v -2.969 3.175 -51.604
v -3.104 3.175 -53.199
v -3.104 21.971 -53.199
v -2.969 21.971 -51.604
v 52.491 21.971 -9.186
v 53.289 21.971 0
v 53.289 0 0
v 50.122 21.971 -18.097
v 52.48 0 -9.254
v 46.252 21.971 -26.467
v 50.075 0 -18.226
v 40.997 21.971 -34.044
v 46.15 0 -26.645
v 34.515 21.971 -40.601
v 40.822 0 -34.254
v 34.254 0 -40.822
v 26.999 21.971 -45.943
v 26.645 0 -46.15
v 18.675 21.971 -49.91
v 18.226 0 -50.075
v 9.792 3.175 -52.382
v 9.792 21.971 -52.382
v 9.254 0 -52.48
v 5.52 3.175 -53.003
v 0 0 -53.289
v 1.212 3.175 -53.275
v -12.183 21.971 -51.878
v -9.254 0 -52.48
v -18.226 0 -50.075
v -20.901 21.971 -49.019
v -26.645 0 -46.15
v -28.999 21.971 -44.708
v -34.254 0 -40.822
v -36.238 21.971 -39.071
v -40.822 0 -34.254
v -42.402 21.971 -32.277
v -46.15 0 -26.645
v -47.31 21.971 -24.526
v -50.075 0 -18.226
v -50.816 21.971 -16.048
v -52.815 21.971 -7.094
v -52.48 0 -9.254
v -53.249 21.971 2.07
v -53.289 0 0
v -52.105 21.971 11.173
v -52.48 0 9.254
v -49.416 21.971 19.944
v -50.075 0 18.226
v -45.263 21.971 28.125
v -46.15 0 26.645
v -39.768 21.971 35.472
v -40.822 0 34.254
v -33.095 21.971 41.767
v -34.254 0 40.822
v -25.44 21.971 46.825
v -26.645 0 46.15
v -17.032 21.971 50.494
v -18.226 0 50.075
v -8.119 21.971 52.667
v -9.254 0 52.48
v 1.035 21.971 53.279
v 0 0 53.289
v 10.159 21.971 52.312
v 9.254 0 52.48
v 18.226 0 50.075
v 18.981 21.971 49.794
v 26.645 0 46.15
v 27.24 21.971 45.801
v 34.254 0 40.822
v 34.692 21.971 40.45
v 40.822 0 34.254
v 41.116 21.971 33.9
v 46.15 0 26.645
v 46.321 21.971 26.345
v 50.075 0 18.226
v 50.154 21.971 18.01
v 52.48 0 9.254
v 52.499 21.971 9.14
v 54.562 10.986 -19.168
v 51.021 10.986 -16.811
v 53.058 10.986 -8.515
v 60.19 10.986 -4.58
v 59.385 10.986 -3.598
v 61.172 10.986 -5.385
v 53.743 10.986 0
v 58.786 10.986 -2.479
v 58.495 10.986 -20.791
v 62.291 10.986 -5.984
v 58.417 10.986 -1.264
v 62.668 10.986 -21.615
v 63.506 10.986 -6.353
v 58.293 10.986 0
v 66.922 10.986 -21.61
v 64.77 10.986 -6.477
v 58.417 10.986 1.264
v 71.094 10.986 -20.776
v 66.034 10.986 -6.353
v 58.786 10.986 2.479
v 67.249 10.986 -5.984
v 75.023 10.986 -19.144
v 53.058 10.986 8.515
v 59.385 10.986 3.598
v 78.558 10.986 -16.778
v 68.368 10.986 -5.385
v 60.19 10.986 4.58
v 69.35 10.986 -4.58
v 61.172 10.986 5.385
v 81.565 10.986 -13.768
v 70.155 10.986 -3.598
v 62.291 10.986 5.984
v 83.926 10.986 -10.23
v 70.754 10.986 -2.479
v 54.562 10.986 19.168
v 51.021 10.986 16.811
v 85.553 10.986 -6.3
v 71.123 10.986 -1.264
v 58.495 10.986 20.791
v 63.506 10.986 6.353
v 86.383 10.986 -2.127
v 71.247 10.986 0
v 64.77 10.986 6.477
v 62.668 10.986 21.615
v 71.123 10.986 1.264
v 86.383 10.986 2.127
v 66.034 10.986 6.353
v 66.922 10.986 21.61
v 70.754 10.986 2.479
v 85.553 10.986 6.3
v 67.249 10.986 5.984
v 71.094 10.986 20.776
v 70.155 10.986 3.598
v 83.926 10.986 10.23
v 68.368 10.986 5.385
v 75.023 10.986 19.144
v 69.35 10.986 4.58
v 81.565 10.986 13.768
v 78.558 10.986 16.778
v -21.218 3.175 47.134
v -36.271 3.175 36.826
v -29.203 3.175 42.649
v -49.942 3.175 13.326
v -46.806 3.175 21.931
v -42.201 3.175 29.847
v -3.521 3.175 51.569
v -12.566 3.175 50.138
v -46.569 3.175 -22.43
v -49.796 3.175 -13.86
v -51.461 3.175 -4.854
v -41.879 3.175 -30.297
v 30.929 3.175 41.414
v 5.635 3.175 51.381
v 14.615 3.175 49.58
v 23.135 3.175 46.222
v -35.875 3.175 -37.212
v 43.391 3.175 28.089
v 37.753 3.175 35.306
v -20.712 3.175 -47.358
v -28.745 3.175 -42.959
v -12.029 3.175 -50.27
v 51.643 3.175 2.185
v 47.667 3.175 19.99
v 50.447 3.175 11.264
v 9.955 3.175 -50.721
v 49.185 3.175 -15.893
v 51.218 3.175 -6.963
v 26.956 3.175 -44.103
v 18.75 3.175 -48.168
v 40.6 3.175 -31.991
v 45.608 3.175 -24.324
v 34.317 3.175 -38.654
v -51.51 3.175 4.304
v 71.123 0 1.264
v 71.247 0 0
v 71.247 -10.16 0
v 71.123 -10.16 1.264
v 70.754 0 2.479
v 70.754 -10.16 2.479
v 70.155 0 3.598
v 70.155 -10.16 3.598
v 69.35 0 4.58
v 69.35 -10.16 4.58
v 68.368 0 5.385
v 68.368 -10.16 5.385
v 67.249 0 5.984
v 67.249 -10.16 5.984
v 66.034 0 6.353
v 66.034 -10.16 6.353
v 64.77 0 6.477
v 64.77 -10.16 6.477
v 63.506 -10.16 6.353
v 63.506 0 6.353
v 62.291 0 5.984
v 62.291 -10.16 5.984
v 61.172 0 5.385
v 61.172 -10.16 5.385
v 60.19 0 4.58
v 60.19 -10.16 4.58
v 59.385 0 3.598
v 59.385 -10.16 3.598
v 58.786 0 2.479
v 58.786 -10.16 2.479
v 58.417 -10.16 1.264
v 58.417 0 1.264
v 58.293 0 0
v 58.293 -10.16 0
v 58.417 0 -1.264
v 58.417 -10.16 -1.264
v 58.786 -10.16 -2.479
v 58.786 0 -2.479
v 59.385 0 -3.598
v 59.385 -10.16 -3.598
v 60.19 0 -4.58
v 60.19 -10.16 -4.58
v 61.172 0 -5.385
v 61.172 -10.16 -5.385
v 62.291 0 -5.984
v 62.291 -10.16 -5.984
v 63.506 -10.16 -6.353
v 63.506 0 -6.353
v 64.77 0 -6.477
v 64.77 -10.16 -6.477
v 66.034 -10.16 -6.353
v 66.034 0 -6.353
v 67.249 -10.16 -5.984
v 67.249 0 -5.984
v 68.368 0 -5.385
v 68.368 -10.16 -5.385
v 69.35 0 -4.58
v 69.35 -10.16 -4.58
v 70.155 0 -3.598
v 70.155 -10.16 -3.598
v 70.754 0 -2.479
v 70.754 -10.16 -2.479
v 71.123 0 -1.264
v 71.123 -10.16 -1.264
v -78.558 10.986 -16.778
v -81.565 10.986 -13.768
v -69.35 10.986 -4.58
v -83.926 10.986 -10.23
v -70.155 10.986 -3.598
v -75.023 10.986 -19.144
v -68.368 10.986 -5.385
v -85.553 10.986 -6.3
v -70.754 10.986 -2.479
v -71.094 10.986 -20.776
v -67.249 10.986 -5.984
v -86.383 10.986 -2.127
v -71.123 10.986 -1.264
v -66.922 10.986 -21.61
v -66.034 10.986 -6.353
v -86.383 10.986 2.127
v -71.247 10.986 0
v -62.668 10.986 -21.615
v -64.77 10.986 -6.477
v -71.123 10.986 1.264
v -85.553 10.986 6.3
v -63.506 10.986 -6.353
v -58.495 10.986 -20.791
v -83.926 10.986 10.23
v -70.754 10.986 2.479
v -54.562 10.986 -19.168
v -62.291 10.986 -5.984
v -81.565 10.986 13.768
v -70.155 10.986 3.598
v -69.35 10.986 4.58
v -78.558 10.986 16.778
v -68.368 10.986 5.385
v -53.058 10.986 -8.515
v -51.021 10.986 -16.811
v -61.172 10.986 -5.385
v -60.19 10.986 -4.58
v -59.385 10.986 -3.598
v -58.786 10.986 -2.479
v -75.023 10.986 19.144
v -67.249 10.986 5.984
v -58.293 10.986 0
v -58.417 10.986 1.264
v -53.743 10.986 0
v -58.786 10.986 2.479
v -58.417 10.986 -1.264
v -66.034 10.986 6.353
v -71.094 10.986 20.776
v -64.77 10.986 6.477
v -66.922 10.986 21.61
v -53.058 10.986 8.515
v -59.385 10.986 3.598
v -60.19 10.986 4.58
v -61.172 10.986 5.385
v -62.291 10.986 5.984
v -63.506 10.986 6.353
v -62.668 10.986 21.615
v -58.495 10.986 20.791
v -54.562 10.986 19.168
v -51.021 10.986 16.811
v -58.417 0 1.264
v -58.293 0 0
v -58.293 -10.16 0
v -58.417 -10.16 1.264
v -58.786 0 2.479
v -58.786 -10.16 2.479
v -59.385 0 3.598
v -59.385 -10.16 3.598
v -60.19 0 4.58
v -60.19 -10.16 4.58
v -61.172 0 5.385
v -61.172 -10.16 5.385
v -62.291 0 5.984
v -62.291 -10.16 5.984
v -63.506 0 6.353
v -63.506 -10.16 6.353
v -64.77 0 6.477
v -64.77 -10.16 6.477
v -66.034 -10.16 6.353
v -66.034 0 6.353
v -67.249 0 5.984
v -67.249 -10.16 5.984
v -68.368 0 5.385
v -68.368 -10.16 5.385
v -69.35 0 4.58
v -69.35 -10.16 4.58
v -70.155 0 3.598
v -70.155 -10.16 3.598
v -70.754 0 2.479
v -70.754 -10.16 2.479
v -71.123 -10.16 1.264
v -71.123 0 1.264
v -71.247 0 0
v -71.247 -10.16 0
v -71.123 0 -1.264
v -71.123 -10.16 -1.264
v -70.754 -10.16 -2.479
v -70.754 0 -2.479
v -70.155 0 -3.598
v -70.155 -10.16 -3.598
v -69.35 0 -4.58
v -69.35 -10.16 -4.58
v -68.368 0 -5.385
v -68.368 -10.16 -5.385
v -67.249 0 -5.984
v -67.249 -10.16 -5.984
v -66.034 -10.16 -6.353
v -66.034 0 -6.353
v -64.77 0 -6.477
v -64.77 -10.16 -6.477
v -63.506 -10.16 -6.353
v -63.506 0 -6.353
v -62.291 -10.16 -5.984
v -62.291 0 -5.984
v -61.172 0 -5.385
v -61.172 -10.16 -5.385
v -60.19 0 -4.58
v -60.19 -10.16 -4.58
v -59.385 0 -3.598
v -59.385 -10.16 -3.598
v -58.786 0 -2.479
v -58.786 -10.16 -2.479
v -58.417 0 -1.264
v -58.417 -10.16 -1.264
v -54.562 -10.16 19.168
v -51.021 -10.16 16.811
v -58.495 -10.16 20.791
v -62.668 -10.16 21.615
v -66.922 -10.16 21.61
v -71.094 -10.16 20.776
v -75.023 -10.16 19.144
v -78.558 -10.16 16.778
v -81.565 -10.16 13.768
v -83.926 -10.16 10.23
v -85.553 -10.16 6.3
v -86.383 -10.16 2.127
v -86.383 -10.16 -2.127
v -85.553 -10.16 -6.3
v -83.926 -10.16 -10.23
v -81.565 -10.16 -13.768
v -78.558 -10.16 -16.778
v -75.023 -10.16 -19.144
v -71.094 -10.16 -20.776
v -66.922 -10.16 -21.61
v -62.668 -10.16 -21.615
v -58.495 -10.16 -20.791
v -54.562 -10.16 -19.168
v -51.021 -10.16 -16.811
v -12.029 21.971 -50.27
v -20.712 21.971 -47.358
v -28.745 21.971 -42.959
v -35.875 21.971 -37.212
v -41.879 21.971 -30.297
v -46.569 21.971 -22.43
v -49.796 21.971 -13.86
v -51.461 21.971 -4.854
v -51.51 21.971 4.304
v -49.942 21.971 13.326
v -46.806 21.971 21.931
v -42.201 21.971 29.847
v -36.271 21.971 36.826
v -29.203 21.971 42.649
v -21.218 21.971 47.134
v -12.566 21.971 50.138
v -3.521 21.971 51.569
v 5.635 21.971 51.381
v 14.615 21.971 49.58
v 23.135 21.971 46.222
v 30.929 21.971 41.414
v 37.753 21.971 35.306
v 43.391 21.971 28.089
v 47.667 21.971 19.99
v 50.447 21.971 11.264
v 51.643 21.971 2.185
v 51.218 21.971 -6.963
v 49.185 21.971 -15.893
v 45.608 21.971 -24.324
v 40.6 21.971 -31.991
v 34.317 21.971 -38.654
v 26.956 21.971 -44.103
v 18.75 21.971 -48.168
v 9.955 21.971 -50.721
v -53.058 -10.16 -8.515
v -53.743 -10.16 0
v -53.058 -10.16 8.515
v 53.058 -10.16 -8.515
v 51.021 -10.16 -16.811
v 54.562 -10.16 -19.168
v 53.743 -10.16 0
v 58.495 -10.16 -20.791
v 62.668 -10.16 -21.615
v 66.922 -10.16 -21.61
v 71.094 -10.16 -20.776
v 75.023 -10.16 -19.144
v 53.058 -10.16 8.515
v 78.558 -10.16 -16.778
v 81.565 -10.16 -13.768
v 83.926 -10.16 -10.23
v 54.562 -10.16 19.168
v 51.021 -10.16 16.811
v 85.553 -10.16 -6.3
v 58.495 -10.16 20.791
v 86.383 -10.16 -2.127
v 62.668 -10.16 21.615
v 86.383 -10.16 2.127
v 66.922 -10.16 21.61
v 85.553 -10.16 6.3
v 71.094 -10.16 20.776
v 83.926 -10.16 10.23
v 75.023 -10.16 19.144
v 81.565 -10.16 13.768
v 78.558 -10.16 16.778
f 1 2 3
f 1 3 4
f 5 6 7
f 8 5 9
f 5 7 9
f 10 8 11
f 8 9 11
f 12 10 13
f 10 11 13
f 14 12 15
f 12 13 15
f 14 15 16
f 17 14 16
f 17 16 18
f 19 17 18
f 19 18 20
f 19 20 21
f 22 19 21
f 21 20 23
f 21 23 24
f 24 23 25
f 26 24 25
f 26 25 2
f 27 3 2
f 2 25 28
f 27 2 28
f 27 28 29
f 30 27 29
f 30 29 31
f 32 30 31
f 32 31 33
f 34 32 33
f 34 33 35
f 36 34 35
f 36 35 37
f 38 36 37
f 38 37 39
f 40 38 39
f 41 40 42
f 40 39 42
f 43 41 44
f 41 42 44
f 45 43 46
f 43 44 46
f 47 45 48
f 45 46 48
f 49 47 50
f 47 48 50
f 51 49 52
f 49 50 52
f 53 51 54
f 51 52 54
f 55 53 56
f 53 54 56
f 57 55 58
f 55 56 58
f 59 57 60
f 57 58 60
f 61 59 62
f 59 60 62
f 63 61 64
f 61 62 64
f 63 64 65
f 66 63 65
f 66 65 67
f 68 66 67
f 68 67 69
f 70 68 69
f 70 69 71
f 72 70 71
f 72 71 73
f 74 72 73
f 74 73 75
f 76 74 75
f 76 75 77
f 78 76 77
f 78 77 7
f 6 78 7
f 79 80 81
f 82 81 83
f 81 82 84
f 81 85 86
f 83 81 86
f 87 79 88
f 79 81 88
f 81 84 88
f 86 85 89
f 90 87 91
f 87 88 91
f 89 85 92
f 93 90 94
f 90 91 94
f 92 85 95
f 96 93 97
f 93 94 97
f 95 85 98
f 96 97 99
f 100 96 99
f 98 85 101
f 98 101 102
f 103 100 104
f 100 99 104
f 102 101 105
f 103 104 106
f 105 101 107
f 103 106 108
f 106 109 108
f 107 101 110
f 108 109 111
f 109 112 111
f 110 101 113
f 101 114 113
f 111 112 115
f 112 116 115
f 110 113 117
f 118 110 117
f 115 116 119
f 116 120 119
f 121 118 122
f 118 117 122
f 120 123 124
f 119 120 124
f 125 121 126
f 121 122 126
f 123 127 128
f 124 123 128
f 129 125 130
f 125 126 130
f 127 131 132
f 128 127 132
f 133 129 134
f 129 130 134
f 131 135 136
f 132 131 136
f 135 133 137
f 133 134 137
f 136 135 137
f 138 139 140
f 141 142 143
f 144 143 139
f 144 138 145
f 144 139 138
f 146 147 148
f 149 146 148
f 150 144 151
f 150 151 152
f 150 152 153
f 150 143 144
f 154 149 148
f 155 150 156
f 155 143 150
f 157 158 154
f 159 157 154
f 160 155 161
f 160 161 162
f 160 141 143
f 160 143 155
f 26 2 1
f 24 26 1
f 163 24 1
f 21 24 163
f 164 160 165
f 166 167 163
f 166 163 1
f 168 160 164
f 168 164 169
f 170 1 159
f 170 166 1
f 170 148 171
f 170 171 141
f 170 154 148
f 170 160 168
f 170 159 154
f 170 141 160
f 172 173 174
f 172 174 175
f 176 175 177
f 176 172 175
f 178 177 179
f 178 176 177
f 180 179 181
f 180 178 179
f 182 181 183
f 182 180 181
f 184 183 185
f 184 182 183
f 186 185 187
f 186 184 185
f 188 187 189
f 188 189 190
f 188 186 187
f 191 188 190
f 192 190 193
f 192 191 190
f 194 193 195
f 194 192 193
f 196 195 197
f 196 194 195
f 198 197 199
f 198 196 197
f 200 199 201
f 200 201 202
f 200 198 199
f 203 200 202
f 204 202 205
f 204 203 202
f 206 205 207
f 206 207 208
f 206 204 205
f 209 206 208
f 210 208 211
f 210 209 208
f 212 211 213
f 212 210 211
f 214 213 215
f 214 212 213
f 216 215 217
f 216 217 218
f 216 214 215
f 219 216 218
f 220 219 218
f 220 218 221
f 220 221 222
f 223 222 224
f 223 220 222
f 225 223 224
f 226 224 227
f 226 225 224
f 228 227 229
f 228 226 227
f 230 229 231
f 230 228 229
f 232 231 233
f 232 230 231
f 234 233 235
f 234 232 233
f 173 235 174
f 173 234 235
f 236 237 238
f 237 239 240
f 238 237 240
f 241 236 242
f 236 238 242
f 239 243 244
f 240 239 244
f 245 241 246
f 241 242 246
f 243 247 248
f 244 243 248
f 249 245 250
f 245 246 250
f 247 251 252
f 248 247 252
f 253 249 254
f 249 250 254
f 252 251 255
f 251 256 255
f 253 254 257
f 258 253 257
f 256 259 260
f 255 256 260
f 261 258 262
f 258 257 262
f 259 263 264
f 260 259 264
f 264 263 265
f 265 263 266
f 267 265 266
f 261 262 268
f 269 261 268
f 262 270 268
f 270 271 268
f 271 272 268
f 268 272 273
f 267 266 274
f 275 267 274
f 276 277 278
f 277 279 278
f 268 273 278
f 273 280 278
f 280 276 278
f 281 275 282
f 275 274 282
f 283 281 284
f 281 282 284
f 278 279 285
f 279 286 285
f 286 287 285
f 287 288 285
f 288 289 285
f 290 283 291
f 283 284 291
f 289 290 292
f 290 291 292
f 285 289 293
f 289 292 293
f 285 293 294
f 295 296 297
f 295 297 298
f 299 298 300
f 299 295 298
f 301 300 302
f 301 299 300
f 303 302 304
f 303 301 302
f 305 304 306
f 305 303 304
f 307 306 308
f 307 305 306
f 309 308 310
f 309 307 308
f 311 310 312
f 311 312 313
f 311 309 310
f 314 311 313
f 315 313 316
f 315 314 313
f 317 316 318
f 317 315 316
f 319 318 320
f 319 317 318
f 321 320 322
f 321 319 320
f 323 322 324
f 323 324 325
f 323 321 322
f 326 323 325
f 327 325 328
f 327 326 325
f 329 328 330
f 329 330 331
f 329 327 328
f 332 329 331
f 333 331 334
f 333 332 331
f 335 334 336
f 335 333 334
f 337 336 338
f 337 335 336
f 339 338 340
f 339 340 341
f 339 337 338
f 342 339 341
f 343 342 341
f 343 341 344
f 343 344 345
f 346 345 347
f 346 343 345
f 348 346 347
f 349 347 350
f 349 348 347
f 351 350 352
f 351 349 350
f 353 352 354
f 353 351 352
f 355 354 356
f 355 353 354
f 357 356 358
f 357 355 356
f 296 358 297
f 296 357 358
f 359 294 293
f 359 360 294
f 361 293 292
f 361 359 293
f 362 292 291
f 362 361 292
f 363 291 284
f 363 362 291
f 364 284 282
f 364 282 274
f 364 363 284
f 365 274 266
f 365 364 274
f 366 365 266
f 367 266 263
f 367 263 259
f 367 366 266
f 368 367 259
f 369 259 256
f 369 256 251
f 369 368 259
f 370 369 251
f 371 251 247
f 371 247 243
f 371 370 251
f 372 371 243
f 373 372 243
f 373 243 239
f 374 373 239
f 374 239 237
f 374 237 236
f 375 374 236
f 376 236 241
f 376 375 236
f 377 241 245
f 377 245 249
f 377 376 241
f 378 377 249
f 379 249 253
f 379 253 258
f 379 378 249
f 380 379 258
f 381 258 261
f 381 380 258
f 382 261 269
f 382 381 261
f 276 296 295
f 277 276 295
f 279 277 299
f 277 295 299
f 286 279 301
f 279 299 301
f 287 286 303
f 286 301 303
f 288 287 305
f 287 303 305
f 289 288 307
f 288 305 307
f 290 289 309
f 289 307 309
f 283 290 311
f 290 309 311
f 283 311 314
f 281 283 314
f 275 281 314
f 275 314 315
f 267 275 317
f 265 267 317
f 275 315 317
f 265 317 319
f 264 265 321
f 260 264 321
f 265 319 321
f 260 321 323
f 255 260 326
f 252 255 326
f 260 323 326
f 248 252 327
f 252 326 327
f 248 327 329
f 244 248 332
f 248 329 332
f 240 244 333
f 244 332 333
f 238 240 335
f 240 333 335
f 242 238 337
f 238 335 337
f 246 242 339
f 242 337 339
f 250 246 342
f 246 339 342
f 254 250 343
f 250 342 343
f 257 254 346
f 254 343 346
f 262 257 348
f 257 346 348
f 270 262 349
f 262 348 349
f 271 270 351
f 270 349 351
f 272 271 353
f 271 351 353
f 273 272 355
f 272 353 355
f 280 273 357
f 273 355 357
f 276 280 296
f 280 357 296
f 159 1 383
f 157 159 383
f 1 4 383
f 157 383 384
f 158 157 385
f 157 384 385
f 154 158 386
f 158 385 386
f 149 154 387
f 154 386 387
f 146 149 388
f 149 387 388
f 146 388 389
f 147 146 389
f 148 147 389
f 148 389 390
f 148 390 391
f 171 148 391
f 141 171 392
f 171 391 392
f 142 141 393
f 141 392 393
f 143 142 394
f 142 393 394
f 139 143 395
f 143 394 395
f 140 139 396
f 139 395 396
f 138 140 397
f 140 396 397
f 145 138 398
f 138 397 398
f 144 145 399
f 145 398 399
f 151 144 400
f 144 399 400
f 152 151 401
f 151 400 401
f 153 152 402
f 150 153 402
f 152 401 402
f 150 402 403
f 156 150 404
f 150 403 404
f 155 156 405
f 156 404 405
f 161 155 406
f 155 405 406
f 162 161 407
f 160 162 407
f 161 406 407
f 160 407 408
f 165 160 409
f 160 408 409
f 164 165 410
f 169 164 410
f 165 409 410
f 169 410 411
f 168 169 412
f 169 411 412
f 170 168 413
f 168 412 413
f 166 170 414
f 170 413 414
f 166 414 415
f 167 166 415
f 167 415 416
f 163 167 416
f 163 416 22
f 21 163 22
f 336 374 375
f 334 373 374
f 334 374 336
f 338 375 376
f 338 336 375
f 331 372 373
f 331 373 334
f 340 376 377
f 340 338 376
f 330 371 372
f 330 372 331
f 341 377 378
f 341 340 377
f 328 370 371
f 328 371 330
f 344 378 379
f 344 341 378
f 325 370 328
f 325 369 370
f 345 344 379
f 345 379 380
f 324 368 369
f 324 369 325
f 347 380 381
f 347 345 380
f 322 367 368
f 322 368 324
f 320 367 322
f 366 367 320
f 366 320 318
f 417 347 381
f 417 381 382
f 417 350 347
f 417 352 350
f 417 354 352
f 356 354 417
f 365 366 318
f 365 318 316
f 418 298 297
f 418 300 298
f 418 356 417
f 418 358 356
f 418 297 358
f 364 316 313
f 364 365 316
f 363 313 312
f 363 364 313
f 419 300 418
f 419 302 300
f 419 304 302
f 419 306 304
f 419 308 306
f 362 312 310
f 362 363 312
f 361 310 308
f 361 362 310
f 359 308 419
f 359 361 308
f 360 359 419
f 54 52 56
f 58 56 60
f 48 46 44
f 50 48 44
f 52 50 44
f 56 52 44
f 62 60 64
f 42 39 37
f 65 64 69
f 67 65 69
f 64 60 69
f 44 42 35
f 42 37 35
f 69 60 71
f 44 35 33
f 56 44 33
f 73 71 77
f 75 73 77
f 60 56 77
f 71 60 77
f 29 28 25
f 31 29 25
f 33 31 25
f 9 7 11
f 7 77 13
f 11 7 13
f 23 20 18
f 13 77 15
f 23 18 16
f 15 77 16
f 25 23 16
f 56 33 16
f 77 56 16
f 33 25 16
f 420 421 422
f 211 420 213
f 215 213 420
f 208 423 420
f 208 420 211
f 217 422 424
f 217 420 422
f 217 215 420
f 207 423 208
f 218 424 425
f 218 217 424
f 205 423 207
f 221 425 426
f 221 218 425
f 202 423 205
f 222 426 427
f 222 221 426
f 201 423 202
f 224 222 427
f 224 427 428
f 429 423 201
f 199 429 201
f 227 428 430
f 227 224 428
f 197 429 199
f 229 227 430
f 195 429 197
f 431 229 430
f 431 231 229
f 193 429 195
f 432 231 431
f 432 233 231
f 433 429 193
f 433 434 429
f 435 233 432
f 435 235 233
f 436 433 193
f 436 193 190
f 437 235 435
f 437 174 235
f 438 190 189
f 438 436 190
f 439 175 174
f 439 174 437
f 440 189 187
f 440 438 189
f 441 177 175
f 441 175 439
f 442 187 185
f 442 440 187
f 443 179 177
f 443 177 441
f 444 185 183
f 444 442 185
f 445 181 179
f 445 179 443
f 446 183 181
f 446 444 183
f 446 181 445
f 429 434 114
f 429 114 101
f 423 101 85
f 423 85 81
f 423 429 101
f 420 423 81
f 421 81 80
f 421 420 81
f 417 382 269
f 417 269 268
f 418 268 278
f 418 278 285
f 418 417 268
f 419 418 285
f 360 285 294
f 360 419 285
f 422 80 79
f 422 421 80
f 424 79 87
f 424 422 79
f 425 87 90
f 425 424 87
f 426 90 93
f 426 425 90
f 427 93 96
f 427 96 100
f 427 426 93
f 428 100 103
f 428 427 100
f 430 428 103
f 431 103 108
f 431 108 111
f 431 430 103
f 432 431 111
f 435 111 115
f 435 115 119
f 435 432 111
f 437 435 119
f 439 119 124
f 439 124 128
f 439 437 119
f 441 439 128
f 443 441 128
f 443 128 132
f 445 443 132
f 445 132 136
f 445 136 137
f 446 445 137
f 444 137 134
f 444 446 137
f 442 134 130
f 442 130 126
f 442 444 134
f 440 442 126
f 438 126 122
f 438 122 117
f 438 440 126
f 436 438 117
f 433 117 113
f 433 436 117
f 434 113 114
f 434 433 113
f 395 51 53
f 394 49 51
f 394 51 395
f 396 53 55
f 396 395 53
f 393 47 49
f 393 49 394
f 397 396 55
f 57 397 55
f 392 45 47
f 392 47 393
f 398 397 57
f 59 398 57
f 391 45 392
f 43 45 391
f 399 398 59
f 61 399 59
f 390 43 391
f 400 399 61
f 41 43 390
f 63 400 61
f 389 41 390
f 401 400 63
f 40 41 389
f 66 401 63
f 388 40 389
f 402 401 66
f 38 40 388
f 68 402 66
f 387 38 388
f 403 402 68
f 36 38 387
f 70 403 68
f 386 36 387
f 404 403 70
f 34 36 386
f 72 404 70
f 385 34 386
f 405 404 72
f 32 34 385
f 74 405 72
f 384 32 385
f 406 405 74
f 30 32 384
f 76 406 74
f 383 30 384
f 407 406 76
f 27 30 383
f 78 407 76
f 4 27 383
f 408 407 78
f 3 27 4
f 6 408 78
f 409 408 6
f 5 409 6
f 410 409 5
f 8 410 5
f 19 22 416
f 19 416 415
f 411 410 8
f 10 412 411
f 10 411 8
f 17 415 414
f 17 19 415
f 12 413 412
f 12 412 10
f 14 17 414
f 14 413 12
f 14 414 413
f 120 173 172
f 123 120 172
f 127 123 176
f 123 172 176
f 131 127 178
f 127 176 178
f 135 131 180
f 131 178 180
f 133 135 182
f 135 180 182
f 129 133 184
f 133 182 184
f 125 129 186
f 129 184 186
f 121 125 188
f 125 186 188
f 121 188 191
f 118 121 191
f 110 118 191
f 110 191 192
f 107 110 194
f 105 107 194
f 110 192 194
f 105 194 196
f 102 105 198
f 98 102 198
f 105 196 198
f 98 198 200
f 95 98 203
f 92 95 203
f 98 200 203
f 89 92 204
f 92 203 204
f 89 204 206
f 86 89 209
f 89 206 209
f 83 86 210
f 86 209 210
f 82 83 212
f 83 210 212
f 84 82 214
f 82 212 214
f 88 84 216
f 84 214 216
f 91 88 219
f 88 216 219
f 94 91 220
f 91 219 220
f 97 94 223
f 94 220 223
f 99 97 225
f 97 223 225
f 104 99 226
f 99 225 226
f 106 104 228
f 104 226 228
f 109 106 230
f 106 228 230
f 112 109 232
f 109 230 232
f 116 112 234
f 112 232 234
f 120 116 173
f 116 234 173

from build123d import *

# Parameters (mm, degrees)
SKETCH1_R                  = 53.2892
BOSS_EXTRUDE1_DEPTH        = 21.971
SKETCH3_R                  = 51.689
CUT_EXTRUDE2_DEPTH         = 18.796
CUT_EXTRUDE7_DEPTH         = 18.796
SKETCH7_R                  = 6.477
BOSS_EXTRUDE3_DEPTH        = 10.16
BOSS_EXTRUDE3_DEPTH_BACK   = 10.9855
BOSS_EXTRUDE3_2_DEPTH      = 10.16
BOSS_EXTRUDE3_2_DEPTH_BACK = 10.9855


with BuildPart() as part:
    # Sketch1 → Boss-Extrude1 (new body)
    with BuildSketch(Plane(origin=(0, 0, 0), x_dir=(1, 0, 0), z_dir=(0, 1, 0))):
        Circle(SKETCH1_R)
    extrude(amount=BOSS_EXTRUDE1_DEPTH)

    # Sketch3 → Cut-Extrude2 (cut)
    with BuildSketch(Plane(origin=(0, 21.971, 0), x_dir=(1, 0, 0), z_dir=(0, 1, 0))):
        Circle(SKETCH3_R)
    extrude(amount=-CUT_EXTRUDE2_DEPTH, mode=Mode.SUBTRACT)

    # Sketch6 → Cut-Extrude7 (cut)
    with BuildSketch(Plane(origin=(0, 21.971, 0), x_dir=(1, 0, 0), z_dir=(0, 1, 0))):
        with BuildLine():
            Line((9.954937367, 50.721316456), (9.791852008, 52.381852496))
            ThreePointArc((9.791852008, 52.381852496), (3.368560686, 53.182625316), (-3.104433229, 53.198696704))
            Line((-3.104433229, 53.198696704), (-2.968977791, 51.603661613))
            ThreePointArc((-2.968977791, 51.603661613), (3.520730186, 51.568955583), (9.954937367, 50.721316456))
        make_face()
    extrude(amount=-CUT_EXTRUDE7_DEPTH, mode=Mode.SUBTRACT)


with BuildPart() as body_2:
    # Sketch7 → Boss-Extrude3 (new body, two sides)
    with BuildSketch(Plane.XZ) as boss_extrude3_sk:
        with BuildLine():
            ThreePointArc((51.021222794, -16.810687504), (86.487, 0), (51.021222794, 16.810687504))
            ThreePointArc((51.021222794, 16.810687504), (53.742938274, 0), (51.021222794, -16.810687504))
        make_face()
        with Locations((64.77, 0)):
            Circle(SKETCH7_R, mode=Mode.SUBTRACT)
    extrude(amount=BOSS_EXTRUDE3_DEPTH)
    extrude(boss_extrude3_sk.sketch, amount=-BOSS_EXTRUDE3_DEPTH_BACK)


with BuildPart() as body_3:
    # Sketch7 → Boss-Extrude3 2 (new body, two sides)
    with BuildSketch(Plane.XZ) as boss_extrude3_2_sk:
        with BuildLine():
            ThreePointArc((-51.021222794, 16.810687504), (-86.487, 0), (-51.021222794, -16.810687504))
            ThreePointArc((-51.021222794, -16.810687504), (-53.742938274, 0), (-51.021222794, 16.810687504))
        make_face()
        with Locations((-64.77, 0)):
            Circle(SKETCH7_R, mode=Mode.SUBTRACT)
    extrude(amount=BOSS_EXTRUDE3_2_DEPTH)
    extrude(boss_extrude3_2_sk.sketch, amount=-BOSS_EXTRUDE3_2_DEPTH_BACK)


solid = Compound([part.part, body_2.part, body_3.part])
